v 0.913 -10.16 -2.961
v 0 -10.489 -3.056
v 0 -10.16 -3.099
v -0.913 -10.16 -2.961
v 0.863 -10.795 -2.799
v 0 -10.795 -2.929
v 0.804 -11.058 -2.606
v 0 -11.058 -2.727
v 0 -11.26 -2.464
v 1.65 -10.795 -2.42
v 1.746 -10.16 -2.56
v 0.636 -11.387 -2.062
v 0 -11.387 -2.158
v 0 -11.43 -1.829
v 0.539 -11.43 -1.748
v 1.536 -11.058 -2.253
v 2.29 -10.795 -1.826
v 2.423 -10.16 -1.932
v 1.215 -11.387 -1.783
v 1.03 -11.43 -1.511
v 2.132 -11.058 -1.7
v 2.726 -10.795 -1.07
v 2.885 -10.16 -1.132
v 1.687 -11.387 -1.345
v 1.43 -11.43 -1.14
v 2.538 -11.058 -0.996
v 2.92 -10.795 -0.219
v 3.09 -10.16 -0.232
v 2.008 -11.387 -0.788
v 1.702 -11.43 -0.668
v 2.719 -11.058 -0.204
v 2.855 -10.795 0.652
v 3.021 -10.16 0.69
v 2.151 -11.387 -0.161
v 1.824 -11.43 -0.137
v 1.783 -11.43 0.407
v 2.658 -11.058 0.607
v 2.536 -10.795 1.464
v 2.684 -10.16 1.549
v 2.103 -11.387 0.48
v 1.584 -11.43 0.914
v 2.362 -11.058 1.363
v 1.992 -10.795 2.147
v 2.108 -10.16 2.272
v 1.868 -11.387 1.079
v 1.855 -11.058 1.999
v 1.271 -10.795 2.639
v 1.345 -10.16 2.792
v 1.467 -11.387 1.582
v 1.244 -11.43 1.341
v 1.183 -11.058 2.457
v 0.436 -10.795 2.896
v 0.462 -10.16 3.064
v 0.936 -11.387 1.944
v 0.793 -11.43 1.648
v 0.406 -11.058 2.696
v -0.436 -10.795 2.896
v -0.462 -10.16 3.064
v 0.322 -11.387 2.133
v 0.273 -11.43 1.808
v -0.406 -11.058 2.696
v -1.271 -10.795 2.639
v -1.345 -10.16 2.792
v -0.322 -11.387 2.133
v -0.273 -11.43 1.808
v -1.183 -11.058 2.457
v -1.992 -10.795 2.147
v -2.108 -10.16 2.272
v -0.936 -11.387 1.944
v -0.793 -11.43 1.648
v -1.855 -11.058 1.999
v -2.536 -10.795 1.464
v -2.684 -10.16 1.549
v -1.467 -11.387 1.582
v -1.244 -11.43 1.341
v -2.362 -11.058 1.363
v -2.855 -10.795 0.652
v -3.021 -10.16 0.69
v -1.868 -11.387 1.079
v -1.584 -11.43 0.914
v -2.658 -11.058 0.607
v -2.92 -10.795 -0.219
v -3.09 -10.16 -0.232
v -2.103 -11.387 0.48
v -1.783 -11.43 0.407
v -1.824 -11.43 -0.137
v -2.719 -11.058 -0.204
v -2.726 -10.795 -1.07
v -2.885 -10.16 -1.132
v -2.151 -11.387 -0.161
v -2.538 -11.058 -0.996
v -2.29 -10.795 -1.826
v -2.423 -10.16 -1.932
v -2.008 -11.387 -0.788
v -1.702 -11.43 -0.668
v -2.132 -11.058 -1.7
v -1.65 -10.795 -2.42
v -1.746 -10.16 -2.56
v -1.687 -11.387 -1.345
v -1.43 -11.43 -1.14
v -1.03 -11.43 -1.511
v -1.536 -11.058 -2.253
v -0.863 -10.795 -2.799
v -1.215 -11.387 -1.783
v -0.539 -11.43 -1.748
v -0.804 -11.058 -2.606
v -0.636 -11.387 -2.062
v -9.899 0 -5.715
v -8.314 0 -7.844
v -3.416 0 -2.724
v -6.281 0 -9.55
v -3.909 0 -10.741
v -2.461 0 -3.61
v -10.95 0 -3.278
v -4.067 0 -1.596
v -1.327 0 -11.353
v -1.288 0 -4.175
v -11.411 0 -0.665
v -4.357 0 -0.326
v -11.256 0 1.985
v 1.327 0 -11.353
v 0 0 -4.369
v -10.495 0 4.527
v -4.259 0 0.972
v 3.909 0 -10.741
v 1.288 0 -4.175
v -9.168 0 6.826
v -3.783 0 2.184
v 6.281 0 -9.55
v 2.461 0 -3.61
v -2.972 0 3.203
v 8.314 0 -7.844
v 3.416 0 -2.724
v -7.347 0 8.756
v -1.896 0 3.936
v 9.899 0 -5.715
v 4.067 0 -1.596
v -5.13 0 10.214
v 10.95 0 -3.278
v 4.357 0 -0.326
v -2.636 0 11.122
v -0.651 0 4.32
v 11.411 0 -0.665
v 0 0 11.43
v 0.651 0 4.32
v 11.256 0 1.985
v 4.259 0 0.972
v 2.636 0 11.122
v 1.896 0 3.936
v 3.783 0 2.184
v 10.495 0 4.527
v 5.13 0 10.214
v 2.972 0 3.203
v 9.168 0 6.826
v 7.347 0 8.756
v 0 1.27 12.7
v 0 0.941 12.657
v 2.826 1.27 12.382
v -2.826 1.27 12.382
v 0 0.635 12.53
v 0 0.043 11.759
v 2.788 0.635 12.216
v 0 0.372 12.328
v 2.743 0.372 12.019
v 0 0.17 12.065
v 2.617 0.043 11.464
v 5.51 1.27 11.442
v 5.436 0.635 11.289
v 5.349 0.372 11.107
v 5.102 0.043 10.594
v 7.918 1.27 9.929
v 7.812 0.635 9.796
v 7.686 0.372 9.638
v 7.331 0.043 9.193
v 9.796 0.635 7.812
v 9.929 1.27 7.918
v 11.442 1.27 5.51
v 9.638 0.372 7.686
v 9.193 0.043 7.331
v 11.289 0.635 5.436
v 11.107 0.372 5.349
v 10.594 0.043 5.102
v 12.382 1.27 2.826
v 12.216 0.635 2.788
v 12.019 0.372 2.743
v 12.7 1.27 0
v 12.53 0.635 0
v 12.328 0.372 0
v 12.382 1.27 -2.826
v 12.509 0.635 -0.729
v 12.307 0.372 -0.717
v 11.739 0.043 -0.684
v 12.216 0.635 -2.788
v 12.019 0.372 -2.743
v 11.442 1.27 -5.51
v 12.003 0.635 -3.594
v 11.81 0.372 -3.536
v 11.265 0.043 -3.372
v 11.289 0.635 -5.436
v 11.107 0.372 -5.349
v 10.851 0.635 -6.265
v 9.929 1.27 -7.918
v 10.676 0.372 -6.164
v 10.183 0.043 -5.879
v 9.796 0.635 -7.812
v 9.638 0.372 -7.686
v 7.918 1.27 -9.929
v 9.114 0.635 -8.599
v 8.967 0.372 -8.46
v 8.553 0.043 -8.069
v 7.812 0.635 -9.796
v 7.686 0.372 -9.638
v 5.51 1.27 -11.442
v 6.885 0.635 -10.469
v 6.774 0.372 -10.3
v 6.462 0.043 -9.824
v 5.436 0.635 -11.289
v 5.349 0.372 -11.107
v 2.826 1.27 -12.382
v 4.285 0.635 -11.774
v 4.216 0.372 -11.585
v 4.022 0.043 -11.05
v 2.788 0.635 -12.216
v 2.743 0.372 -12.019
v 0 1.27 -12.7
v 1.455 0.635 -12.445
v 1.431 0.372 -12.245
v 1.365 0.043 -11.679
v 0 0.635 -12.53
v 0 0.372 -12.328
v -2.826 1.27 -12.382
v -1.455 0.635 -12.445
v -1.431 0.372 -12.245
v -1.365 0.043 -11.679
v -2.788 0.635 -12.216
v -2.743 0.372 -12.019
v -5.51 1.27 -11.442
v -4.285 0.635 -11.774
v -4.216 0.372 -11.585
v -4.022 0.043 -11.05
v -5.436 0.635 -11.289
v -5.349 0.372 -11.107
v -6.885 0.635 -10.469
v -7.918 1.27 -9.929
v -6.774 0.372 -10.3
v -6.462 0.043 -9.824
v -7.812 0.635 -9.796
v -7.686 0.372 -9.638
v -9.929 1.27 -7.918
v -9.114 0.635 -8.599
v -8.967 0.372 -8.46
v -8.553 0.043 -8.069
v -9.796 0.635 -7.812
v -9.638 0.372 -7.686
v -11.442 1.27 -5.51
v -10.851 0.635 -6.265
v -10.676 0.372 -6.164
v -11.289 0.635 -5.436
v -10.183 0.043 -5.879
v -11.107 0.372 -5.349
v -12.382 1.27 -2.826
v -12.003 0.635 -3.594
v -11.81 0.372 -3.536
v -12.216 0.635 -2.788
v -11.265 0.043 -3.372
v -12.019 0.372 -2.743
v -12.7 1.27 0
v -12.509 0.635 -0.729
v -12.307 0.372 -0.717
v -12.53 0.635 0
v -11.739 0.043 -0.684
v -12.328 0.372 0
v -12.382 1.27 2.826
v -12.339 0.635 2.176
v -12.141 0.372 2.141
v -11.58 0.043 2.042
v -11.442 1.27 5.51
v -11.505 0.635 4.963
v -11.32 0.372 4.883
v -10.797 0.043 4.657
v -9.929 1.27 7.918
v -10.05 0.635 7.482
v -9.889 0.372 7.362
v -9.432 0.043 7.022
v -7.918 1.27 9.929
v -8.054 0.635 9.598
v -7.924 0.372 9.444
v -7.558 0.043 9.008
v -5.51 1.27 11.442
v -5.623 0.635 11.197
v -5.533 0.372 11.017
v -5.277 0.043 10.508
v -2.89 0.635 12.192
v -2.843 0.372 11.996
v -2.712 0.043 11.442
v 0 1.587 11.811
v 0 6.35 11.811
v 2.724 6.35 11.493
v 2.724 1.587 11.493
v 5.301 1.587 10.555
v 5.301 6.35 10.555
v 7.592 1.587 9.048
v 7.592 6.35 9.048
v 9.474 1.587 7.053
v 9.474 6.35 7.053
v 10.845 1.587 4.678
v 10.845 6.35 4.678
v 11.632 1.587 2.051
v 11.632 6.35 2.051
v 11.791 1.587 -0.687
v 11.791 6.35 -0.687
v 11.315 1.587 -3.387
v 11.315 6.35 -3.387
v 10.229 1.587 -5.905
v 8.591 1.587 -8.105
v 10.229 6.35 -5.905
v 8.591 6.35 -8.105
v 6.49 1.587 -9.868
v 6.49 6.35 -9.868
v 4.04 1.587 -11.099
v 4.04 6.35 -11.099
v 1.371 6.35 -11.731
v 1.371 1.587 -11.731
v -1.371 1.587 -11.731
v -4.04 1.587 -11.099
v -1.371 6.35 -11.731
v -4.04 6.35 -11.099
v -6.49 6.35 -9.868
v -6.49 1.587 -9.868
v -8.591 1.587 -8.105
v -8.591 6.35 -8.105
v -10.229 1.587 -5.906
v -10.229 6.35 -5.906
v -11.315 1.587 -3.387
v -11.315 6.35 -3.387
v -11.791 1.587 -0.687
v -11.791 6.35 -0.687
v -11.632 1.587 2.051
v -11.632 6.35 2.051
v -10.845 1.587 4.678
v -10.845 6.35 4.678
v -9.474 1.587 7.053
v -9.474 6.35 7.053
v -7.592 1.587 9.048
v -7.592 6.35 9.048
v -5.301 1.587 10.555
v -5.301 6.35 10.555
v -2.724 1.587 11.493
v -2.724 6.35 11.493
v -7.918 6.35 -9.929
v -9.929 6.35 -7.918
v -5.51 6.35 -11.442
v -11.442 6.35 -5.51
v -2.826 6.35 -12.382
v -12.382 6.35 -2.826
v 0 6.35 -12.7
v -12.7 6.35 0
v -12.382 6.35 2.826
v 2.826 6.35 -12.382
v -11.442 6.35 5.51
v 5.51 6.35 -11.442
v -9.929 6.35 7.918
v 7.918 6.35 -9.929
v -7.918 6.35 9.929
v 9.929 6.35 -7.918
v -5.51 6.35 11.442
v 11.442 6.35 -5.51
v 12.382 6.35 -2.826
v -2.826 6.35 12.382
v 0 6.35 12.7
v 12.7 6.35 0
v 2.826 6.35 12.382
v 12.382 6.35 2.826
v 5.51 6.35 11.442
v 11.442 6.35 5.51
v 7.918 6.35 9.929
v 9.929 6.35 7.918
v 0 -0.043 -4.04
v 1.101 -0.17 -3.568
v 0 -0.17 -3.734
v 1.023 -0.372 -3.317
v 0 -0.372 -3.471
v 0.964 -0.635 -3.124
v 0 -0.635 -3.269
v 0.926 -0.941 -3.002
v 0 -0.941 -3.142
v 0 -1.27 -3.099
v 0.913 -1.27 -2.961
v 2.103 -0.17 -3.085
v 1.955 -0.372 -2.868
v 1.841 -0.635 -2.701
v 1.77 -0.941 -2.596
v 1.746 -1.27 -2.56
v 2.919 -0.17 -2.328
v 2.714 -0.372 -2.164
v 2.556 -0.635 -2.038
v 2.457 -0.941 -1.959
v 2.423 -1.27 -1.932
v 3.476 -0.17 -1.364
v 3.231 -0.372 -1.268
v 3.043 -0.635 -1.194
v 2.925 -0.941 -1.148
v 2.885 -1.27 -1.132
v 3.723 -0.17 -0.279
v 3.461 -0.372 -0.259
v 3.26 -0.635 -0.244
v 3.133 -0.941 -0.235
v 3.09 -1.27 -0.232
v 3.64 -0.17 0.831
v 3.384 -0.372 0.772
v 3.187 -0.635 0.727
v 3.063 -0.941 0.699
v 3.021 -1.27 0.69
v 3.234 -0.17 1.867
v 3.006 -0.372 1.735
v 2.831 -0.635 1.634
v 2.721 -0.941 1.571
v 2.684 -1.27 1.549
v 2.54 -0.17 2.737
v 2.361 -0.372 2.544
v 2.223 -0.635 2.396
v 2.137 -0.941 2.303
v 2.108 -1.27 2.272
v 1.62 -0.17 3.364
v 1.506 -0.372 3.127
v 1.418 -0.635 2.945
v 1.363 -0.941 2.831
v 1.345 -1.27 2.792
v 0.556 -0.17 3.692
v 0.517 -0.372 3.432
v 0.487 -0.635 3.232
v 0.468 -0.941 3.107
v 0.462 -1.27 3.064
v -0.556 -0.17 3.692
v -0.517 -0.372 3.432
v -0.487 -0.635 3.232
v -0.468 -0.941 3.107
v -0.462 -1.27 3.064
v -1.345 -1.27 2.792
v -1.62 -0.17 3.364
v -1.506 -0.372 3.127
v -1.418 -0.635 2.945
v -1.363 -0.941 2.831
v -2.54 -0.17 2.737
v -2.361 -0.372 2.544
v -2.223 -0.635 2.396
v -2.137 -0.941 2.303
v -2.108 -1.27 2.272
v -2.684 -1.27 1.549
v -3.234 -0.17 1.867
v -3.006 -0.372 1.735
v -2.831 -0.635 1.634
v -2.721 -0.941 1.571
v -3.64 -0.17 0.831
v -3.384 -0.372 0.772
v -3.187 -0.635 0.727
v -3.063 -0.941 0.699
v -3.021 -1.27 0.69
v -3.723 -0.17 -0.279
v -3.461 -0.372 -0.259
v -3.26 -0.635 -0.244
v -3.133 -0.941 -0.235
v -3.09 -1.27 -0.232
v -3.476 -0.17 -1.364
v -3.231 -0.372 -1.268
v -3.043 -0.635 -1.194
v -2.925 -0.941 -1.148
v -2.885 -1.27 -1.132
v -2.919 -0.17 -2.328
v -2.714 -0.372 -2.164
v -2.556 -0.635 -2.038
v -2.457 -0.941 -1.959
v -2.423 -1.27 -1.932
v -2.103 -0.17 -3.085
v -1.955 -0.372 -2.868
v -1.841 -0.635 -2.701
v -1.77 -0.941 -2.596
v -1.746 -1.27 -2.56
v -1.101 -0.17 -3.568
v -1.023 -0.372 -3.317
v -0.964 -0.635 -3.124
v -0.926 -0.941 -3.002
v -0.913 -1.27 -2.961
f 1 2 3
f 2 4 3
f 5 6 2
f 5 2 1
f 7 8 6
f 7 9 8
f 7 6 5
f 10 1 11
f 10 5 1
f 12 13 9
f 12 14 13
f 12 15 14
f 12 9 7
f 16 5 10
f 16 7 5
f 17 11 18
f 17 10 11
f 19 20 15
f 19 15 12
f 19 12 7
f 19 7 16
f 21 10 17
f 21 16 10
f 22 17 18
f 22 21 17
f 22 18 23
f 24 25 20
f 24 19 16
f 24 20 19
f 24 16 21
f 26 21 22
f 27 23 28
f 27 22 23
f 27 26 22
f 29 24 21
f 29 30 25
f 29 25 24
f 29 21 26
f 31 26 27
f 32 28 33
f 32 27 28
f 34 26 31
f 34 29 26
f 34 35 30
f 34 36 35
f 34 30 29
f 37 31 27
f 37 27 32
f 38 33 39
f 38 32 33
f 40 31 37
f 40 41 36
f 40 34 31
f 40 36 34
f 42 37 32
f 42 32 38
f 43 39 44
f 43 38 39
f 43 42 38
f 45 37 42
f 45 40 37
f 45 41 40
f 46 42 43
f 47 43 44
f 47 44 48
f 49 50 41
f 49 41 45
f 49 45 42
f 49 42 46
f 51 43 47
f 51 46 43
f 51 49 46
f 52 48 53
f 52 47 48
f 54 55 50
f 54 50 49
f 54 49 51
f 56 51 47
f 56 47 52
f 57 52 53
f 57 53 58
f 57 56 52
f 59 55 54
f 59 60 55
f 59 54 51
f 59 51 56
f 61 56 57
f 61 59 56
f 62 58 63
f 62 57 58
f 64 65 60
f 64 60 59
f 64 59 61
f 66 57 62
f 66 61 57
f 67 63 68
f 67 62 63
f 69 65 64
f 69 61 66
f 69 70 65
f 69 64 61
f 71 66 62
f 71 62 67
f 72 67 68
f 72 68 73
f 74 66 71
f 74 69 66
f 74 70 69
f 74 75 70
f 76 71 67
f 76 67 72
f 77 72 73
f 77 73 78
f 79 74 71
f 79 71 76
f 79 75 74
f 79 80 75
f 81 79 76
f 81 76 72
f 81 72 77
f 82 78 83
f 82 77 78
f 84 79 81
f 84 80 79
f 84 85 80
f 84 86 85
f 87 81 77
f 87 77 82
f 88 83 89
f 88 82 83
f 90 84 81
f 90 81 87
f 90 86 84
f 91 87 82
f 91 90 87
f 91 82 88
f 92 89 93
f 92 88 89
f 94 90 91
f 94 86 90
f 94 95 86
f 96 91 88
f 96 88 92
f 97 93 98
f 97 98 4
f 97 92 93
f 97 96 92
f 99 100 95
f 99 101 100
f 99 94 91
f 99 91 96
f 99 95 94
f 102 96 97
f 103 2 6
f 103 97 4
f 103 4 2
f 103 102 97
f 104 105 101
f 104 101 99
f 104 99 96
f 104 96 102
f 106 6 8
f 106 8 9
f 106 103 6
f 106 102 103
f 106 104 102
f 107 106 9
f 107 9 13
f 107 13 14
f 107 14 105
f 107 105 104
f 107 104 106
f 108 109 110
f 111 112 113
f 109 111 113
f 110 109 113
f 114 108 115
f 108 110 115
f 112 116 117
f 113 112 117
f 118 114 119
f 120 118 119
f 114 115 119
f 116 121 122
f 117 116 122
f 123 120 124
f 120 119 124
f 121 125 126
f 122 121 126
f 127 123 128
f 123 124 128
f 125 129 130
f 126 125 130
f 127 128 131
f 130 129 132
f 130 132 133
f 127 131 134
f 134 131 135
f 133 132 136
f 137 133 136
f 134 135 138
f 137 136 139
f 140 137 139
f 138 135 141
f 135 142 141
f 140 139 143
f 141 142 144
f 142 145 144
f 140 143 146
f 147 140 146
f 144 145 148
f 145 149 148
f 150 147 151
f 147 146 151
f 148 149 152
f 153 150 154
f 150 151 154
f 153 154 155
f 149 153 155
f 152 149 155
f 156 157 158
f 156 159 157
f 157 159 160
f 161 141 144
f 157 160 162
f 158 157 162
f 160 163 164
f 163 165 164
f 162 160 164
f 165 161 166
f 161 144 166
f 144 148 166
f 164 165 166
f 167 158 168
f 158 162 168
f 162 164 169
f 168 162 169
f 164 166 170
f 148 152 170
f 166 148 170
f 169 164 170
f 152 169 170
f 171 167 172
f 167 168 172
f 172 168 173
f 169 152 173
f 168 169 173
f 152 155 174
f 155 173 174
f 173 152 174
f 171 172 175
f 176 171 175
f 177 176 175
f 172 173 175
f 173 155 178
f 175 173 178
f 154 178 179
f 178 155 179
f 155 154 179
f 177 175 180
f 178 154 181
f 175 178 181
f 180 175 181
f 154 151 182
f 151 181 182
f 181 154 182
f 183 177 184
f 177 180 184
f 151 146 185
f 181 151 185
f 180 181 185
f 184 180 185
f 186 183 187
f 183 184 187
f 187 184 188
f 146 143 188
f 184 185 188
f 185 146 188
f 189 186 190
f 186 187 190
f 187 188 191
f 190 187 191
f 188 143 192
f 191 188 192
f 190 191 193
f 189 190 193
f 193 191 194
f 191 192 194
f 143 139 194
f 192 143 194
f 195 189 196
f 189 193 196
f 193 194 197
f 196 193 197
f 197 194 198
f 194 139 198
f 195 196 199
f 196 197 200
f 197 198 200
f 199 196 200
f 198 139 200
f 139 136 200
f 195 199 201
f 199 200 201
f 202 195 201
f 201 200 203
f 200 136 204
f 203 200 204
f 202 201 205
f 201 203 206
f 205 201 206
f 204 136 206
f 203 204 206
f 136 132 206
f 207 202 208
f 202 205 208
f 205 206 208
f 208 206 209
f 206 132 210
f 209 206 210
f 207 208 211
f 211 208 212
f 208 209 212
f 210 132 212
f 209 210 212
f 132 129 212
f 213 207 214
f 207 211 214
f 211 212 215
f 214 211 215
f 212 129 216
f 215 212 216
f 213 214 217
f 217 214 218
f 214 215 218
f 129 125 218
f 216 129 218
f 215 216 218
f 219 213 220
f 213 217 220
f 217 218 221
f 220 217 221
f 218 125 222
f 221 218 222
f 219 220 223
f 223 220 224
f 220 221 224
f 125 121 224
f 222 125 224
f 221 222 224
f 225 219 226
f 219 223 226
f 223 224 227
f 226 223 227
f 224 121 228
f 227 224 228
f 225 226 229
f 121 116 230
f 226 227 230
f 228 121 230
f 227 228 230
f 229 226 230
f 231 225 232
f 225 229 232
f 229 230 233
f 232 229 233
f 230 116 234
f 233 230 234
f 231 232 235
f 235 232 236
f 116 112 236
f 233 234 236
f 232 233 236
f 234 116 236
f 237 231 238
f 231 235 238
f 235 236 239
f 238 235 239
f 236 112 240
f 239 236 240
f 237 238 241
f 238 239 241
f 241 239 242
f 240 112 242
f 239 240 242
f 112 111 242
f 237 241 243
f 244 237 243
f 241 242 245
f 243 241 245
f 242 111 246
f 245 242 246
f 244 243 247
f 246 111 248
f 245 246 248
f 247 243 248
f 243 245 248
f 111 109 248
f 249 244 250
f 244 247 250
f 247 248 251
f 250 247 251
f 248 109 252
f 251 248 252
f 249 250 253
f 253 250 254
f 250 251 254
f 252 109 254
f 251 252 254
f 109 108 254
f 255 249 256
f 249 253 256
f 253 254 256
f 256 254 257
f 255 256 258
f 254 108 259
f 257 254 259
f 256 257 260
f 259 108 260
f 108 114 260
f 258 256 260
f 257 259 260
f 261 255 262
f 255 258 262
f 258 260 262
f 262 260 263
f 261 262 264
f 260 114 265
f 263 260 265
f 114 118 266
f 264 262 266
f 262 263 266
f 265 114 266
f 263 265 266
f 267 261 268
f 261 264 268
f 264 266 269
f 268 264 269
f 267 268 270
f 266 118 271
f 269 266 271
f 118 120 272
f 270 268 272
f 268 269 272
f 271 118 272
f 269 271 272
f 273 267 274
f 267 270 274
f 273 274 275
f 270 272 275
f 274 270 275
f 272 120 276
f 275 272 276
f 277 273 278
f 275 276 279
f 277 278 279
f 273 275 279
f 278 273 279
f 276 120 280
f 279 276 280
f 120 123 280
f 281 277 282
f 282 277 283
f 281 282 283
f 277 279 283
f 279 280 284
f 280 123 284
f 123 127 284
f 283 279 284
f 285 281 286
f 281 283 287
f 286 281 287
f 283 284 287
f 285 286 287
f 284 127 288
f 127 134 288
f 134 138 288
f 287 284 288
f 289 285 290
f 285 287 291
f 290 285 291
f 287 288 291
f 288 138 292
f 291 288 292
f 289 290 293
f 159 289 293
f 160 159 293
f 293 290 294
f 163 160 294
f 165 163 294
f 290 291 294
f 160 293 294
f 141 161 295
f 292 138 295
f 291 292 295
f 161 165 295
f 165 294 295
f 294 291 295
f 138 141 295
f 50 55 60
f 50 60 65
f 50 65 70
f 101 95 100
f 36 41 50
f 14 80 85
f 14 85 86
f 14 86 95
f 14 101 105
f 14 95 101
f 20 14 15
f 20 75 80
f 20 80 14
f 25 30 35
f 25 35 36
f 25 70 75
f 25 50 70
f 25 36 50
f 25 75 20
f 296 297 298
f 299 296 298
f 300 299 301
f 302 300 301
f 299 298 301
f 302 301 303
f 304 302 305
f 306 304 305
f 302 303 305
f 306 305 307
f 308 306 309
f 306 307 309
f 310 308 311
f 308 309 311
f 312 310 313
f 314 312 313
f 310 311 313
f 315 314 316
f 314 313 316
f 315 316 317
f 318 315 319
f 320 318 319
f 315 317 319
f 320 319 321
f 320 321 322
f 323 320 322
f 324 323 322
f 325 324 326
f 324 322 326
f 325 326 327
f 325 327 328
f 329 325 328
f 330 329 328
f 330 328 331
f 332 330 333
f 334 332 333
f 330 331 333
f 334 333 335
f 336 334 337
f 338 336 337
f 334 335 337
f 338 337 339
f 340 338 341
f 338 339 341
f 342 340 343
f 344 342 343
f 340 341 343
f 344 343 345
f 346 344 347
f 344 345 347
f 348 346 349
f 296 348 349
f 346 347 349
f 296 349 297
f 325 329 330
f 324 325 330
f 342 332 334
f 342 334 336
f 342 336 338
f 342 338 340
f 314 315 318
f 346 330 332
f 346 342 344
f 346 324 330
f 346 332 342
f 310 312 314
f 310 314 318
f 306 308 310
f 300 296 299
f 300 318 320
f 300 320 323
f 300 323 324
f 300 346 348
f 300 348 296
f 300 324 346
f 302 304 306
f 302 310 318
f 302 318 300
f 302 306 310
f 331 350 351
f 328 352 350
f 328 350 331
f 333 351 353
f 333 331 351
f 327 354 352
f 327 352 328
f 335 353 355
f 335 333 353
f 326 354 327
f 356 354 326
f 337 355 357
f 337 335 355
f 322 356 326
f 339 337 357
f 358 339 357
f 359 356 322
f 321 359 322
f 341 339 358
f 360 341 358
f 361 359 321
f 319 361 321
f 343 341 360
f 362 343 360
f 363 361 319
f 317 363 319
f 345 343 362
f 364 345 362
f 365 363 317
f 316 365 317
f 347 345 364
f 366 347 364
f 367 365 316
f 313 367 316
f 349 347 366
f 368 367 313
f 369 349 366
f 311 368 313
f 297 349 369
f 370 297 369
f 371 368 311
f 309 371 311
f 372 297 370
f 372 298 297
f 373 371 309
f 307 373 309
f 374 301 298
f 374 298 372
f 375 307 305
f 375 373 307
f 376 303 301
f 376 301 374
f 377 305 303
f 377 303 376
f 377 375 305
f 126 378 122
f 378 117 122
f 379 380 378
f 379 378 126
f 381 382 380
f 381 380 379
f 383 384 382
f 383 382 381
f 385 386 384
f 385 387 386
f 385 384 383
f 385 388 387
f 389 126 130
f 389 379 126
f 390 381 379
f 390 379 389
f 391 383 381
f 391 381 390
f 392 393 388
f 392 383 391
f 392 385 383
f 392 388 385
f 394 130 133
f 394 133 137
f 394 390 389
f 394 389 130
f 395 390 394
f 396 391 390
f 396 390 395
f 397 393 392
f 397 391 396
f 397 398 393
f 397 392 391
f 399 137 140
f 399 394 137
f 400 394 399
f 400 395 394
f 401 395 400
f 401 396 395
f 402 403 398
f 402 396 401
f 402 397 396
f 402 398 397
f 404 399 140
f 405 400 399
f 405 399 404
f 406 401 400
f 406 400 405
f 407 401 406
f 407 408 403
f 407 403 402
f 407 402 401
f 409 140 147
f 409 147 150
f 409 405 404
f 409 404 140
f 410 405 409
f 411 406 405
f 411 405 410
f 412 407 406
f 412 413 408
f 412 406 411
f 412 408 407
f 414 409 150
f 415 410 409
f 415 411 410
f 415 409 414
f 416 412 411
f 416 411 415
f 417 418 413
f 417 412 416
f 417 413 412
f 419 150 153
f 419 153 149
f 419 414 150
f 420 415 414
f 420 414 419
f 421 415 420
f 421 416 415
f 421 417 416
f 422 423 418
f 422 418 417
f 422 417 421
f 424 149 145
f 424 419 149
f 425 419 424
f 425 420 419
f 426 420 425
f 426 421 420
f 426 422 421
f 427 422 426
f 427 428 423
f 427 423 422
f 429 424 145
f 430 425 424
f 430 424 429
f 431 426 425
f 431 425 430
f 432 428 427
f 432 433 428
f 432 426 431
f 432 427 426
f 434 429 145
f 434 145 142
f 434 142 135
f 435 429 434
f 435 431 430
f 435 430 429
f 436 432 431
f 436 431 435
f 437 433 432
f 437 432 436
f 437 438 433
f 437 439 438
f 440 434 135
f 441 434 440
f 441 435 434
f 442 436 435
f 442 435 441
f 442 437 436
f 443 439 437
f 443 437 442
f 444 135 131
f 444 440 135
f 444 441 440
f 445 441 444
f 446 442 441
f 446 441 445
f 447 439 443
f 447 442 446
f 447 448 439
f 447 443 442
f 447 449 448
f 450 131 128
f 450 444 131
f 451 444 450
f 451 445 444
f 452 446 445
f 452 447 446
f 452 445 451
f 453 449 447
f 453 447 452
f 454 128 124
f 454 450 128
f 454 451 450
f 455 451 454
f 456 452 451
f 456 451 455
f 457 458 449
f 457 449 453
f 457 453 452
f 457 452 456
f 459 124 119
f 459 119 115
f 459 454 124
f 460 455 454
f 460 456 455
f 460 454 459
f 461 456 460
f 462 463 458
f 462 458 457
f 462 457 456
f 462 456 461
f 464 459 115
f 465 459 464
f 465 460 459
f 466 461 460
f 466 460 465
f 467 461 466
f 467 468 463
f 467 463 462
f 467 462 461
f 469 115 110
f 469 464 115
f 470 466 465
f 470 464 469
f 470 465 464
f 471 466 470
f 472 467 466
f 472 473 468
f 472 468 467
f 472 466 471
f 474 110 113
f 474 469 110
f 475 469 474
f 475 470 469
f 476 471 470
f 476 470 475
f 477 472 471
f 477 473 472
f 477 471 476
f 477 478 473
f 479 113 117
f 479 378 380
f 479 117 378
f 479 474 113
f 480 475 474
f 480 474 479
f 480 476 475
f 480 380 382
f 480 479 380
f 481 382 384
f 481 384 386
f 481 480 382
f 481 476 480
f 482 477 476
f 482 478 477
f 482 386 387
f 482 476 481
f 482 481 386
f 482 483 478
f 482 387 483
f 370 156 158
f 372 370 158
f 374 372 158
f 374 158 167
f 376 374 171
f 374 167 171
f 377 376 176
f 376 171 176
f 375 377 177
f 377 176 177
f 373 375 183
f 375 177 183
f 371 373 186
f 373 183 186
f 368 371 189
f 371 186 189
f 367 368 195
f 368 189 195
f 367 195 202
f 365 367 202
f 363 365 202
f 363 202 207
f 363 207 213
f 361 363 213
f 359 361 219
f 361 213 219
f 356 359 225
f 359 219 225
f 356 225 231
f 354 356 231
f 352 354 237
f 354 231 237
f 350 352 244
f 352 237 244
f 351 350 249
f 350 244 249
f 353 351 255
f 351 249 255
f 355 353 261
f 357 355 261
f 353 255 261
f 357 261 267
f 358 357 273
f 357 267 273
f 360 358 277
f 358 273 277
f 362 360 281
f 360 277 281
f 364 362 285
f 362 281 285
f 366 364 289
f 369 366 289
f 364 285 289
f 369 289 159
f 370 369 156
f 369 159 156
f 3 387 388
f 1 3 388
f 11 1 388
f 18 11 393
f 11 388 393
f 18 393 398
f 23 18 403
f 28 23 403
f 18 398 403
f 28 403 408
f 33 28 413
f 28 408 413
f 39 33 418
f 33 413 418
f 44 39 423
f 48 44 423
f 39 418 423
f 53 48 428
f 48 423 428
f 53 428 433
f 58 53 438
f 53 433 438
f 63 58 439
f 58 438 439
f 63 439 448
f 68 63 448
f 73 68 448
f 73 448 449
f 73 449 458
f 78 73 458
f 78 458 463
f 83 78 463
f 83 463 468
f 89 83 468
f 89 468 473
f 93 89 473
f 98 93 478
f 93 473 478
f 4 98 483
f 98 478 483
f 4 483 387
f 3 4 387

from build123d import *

# Parameters (mm, degrees)
SKETCH1_R           = 12.7
BOSS_EXTRUDE1_DEPTH = 6.35
SKETCH2_R           = 11.811
CUT_EXTRUDE1_DEPTH  = 4.7625
SKETCH3_R           = 3.0988
BOSS_EXTRUDE2_DEPTH = 11.43
FILLET1_R           = 1.27


with BuildPart() as part:
    # Sketch1 → Boss-Extrude1 (new body)
    with BuildSketch(Plane(origin=(0, 0, 0), x_dir=(1, 0, 0), z_dir=(0, 1, 0))):
        with Locations(Location((0, 0, 0), (0, 0, 270))):
            Circle(SKETCH1_R)
    extrude(amount=BOSS_EXTRUDE1_DEPTH)

    # Sketch2 → Cut-Extrude1 (cut)
    with BuildSketch(Plane(origin=(0, 6.35, 0), x_dir=(1, 0, 0), z_dir=(0, 1, 0))):
        with Locations(Location((0, 0, 0), (0, 0, 270))):
            Circle(SKETCH2_R)
    extrude(amount=-CUT_EXTRUDE1_DEPTH, mode=Mode.SUBTRACT)

    # Sketch3 → Boss-Extrude2 (add)
    with BuildSketch(Plane.XZ):
        with Locations(Location((0, 0, 0), (0, 0, 270))):
            Circle(SKETCH3_R)
    extrude(amount=BOSS_EXTRUDE2_DEPTH)

    # Fillet1
    fillet1_edges = [part.edges().sort_by_distance(p)[0] for p in [
        (0, -11.43, 3.0988),
        (0, 0, -12.7),
        (0, 0, 3.0988),
    ]]
    fillet(fillet1_edges, radius=FILLET1_R)


solid = part.part
